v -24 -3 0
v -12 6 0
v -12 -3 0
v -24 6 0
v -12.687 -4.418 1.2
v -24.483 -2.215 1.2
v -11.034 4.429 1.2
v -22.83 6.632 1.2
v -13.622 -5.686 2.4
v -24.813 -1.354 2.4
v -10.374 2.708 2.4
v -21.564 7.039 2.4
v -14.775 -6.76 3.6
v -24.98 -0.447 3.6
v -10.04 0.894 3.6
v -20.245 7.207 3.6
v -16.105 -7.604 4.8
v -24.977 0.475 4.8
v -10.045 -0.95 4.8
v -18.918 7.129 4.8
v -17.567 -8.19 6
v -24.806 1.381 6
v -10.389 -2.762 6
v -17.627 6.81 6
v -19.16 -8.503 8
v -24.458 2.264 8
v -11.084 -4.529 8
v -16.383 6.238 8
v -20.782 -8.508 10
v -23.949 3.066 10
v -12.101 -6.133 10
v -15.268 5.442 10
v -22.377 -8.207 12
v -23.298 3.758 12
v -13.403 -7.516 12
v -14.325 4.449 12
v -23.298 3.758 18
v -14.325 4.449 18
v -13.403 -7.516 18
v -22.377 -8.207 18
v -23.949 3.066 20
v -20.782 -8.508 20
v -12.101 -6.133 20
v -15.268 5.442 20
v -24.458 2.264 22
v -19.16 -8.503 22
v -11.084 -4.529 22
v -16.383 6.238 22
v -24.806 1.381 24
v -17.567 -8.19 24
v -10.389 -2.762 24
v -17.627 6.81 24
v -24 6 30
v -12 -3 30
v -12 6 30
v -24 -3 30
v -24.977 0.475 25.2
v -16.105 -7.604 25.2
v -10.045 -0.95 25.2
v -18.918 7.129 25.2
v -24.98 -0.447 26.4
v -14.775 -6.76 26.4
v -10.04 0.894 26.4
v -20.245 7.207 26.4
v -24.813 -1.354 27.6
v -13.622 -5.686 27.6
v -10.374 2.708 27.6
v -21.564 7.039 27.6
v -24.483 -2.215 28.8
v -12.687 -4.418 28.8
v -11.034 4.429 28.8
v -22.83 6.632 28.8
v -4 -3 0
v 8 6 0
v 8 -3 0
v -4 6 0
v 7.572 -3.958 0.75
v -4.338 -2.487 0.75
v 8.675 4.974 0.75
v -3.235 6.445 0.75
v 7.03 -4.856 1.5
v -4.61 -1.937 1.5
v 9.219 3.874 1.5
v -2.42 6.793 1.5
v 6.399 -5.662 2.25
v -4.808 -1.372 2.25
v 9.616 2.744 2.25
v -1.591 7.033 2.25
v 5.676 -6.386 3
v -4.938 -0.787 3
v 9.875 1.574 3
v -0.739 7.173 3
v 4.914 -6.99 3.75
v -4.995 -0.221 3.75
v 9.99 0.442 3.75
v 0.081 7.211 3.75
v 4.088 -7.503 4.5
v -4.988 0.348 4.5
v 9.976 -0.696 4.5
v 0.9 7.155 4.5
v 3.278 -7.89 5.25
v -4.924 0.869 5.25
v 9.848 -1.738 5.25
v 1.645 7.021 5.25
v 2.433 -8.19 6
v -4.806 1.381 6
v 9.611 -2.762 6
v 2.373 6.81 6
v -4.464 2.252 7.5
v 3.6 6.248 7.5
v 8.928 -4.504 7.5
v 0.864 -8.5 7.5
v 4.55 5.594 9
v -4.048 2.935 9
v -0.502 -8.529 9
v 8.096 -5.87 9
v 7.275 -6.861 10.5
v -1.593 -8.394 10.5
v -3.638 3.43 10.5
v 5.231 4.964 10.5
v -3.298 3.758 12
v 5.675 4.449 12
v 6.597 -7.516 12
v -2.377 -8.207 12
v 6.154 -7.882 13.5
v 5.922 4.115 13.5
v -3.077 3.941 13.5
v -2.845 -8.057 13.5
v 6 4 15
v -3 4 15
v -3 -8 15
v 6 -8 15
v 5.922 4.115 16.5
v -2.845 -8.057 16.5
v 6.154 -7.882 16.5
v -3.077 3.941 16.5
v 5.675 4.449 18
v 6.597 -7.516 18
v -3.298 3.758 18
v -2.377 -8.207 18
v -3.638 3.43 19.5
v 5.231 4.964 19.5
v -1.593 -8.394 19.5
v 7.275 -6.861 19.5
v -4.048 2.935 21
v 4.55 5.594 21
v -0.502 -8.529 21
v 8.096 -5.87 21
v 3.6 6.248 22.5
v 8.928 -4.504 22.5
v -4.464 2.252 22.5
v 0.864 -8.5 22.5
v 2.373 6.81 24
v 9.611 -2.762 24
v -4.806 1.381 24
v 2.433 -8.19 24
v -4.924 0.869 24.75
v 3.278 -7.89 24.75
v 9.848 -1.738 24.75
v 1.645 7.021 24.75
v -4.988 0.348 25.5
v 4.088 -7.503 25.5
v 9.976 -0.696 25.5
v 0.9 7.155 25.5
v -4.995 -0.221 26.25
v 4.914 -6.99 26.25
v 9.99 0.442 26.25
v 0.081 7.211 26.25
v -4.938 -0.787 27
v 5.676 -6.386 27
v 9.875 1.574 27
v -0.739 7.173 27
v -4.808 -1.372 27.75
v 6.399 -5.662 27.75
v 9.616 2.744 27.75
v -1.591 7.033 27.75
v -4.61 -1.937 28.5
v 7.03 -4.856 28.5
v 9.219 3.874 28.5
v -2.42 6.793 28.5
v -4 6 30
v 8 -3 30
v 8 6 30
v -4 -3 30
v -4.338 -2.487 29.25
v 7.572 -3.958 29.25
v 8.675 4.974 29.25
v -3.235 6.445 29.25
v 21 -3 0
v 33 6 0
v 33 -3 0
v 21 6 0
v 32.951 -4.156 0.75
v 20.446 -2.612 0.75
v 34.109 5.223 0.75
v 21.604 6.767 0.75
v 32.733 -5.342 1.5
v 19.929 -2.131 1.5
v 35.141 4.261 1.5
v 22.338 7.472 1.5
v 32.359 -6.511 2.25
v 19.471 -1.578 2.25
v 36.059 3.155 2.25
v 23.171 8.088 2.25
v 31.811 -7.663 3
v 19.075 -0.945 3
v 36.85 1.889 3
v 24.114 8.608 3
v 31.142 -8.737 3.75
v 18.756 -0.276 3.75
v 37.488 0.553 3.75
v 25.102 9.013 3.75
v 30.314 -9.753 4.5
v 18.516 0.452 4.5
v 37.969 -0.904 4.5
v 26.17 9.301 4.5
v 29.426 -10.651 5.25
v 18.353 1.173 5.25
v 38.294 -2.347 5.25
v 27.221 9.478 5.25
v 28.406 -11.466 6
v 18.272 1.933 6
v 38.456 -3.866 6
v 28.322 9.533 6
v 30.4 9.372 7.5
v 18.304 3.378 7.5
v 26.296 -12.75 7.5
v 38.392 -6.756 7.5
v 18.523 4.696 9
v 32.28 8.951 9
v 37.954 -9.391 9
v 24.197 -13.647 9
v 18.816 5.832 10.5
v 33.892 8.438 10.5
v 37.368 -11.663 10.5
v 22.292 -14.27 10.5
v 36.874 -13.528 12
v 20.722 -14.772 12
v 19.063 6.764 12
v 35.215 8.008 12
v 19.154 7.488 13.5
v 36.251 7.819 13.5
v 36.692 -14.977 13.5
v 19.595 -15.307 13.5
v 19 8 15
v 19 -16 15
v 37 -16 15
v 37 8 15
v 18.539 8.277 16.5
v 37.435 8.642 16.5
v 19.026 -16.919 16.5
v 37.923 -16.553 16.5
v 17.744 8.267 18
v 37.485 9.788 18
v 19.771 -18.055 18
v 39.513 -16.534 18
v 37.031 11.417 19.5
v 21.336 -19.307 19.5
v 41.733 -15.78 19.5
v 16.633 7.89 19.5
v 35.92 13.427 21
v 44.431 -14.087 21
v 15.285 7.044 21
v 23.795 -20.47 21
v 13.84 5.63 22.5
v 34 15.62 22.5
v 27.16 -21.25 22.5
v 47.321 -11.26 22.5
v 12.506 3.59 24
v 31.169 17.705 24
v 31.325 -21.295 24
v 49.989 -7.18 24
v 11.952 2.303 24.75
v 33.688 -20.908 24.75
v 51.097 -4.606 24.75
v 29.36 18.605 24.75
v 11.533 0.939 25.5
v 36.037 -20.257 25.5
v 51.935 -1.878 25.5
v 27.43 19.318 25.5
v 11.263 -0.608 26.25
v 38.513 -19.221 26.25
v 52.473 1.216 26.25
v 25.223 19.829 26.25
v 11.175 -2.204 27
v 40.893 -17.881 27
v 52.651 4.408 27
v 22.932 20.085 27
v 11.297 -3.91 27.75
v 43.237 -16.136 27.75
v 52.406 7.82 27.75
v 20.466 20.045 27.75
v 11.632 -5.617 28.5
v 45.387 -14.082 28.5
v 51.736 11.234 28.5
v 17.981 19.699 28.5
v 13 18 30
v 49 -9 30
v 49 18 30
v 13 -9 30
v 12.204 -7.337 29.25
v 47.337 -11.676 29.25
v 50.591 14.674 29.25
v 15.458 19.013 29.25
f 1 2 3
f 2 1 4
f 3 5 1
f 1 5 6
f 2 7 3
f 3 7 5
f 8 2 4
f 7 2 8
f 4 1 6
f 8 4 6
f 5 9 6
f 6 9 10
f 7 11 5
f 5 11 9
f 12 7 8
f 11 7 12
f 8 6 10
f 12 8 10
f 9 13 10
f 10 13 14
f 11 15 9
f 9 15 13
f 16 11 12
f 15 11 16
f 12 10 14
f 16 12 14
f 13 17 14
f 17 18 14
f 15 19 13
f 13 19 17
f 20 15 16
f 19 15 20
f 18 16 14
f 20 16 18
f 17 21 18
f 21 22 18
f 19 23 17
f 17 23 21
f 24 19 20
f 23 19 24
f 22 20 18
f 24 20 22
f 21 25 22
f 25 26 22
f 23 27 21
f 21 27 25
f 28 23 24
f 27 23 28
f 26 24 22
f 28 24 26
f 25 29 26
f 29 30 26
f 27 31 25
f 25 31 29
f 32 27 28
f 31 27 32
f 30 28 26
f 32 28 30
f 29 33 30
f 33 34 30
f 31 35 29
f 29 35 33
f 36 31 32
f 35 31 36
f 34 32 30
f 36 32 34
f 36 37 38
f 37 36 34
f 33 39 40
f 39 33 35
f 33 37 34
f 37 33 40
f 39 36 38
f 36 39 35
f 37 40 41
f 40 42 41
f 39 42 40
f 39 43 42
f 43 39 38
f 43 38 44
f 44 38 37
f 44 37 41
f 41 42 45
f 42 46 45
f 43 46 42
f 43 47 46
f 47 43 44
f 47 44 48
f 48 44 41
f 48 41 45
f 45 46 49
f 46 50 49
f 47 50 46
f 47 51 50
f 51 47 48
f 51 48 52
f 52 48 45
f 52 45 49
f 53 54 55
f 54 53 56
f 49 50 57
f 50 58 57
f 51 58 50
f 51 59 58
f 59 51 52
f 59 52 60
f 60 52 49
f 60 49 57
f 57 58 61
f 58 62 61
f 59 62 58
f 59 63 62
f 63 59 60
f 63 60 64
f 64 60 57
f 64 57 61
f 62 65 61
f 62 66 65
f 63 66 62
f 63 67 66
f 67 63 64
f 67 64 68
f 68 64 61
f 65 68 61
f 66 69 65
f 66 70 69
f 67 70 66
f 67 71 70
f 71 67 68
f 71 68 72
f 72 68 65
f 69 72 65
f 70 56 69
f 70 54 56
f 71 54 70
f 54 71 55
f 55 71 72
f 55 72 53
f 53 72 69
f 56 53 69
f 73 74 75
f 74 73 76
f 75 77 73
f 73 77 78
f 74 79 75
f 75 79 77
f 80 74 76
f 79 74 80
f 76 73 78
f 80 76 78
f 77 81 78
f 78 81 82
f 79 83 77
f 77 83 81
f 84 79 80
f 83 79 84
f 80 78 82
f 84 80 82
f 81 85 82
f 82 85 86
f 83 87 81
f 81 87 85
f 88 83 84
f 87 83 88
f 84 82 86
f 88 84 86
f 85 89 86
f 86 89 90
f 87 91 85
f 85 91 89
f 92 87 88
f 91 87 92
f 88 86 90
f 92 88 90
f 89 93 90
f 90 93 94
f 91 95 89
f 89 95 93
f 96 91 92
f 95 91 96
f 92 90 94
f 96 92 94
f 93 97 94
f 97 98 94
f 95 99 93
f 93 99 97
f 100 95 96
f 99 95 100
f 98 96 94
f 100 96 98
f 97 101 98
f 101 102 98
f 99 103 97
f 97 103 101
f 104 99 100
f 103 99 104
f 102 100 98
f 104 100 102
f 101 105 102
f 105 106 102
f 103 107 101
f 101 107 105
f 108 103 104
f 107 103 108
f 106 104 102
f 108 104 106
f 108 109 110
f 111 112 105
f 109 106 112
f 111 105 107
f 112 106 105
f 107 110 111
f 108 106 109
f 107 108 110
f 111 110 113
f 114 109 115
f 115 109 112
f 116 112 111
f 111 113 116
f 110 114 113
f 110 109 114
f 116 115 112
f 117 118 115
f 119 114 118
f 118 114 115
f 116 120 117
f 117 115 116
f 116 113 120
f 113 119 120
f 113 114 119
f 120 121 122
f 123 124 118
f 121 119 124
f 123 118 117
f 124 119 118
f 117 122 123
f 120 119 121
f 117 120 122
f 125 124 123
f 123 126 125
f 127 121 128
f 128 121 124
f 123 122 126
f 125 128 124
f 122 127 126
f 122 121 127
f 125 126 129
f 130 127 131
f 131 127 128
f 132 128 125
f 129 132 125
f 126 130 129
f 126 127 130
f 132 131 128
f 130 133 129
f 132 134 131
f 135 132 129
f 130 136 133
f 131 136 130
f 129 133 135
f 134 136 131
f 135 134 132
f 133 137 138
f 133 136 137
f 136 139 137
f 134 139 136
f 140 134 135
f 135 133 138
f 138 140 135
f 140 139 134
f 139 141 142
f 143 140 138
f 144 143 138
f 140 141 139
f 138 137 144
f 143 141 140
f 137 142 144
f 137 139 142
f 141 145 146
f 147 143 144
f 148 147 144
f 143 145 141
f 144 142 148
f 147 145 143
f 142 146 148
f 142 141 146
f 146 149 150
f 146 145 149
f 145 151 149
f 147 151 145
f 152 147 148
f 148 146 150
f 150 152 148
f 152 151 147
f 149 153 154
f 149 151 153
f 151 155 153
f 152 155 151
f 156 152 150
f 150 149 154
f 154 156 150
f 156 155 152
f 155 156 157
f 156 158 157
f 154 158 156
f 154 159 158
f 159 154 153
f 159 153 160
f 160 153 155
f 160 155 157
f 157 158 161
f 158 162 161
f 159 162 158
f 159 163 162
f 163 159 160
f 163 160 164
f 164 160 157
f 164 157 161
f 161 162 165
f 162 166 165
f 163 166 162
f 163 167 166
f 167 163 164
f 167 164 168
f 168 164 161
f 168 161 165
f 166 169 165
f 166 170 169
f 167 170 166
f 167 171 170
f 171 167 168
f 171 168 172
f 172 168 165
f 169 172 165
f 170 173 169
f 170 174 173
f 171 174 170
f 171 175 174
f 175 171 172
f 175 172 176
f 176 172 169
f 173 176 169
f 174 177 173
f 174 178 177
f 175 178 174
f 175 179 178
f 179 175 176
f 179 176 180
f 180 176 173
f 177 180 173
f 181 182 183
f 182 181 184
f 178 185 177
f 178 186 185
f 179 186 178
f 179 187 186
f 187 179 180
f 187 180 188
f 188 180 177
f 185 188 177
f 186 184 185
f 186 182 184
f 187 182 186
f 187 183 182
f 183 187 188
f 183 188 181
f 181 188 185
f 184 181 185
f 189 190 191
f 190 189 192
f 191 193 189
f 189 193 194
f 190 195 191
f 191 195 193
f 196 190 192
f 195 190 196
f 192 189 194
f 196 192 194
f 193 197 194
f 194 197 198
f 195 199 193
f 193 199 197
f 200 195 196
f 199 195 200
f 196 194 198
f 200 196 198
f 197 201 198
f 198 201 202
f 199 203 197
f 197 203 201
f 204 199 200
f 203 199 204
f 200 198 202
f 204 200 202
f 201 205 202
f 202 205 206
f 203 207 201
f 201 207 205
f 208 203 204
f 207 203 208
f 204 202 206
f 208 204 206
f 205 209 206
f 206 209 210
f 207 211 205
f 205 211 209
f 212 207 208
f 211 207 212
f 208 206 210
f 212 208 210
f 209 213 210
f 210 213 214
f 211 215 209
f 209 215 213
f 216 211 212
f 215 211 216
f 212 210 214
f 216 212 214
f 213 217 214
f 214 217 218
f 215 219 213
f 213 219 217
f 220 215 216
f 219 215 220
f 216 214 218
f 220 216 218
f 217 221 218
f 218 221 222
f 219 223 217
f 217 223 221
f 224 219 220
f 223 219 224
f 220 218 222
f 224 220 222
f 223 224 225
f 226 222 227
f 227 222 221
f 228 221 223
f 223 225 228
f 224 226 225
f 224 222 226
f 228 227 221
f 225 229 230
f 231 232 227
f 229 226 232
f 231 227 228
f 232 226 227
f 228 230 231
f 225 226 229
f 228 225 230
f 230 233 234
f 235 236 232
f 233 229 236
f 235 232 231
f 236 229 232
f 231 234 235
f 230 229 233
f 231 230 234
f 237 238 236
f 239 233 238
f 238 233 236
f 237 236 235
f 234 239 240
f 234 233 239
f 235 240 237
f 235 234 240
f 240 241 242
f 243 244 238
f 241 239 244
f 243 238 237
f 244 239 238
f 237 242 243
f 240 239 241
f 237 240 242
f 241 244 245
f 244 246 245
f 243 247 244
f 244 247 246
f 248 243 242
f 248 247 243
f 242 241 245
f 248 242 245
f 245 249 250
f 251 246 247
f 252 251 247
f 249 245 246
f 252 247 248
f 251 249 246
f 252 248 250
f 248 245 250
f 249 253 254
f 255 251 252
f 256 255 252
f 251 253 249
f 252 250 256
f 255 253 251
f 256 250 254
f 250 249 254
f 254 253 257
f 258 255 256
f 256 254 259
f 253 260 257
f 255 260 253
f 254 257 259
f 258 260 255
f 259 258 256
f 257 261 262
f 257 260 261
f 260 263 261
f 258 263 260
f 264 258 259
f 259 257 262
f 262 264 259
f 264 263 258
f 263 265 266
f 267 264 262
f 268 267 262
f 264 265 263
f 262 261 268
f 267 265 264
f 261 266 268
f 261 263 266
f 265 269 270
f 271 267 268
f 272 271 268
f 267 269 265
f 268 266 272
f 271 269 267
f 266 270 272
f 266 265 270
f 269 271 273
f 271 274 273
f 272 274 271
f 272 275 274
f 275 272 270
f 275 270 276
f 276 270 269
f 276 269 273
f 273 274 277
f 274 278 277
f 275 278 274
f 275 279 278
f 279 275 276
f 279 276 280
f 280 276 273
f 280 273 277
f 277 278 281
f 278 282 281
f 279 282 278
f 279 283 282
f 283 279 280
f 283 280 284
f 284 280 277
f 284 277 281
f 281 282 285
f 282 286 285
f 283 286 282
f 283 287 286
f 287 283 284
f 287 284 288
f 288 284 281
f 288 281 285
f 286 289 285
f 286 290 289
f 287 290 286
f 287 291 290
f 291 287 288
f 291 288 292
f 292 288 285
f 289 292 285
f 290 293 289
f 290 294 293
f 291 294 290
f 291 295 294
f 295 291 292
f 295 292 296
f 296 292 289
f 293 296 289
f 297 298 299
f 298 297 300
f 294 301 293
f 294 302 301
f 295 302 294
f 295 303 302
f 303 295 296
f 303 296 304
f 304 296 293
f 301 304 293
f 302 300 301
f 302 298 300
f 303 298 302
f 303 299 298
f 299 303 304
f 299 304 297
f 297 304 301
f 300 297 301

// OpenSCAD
//Linear Extrude with Twist as an interpolated function
// This module does not need to be modified,
// - unless default parameters want to be changed
// - or additional parameters want to be forwarded (e.g. slices,...)
module linear_extrude_ft(height=1,isteps=20,scale=1){
  //union of piecewise generated extrudes
  union(){
    for(i = [ 0: 1: isteps-1]){
      //each new piece needs to be adjusted for height
      translate([0,0,i*height/isteps])
       linear_extrude(
        height=height/isteps,
        twist=f_left((i+1)/isteps)-f_left((i)/isteps),
        scale=(1-(1-scale)*(i+1)/isteps)/(1-(1-scale)*i/isteps)
       )
        //Rotate to next start point
        rotate([0,0,-f_left(i/isteps)])
         //Scale to end of last piece size
         scale(1-(1-scale)*(i/isteps))
          obj2D_left();
    }
  }
}
// This function defines the twist function
// - Function name must not be modified
// - Modify the contents/return value to define the function
function f_left(x) =
  let(twist=90,span=180,start=0)
  twist*sin(x*span+start);
// This module defines the base 2D object to be extruded
// - Function name must not be modified
// - Modify the contents to define the base 2D object
module obj2D_left(){
  translate([-4,-3])
   square([12,9]);
}
//Left rendered object demonstrating the interpolation steps
translate([-20,0])
linear_extrude_ft(height=30,isteps=5);
linear_extrude_ft(height=30);
//Right rendered object demonstrating the scale inclusion
translate([25,0])
linear_extrude_ft(height=30,scale=3);
